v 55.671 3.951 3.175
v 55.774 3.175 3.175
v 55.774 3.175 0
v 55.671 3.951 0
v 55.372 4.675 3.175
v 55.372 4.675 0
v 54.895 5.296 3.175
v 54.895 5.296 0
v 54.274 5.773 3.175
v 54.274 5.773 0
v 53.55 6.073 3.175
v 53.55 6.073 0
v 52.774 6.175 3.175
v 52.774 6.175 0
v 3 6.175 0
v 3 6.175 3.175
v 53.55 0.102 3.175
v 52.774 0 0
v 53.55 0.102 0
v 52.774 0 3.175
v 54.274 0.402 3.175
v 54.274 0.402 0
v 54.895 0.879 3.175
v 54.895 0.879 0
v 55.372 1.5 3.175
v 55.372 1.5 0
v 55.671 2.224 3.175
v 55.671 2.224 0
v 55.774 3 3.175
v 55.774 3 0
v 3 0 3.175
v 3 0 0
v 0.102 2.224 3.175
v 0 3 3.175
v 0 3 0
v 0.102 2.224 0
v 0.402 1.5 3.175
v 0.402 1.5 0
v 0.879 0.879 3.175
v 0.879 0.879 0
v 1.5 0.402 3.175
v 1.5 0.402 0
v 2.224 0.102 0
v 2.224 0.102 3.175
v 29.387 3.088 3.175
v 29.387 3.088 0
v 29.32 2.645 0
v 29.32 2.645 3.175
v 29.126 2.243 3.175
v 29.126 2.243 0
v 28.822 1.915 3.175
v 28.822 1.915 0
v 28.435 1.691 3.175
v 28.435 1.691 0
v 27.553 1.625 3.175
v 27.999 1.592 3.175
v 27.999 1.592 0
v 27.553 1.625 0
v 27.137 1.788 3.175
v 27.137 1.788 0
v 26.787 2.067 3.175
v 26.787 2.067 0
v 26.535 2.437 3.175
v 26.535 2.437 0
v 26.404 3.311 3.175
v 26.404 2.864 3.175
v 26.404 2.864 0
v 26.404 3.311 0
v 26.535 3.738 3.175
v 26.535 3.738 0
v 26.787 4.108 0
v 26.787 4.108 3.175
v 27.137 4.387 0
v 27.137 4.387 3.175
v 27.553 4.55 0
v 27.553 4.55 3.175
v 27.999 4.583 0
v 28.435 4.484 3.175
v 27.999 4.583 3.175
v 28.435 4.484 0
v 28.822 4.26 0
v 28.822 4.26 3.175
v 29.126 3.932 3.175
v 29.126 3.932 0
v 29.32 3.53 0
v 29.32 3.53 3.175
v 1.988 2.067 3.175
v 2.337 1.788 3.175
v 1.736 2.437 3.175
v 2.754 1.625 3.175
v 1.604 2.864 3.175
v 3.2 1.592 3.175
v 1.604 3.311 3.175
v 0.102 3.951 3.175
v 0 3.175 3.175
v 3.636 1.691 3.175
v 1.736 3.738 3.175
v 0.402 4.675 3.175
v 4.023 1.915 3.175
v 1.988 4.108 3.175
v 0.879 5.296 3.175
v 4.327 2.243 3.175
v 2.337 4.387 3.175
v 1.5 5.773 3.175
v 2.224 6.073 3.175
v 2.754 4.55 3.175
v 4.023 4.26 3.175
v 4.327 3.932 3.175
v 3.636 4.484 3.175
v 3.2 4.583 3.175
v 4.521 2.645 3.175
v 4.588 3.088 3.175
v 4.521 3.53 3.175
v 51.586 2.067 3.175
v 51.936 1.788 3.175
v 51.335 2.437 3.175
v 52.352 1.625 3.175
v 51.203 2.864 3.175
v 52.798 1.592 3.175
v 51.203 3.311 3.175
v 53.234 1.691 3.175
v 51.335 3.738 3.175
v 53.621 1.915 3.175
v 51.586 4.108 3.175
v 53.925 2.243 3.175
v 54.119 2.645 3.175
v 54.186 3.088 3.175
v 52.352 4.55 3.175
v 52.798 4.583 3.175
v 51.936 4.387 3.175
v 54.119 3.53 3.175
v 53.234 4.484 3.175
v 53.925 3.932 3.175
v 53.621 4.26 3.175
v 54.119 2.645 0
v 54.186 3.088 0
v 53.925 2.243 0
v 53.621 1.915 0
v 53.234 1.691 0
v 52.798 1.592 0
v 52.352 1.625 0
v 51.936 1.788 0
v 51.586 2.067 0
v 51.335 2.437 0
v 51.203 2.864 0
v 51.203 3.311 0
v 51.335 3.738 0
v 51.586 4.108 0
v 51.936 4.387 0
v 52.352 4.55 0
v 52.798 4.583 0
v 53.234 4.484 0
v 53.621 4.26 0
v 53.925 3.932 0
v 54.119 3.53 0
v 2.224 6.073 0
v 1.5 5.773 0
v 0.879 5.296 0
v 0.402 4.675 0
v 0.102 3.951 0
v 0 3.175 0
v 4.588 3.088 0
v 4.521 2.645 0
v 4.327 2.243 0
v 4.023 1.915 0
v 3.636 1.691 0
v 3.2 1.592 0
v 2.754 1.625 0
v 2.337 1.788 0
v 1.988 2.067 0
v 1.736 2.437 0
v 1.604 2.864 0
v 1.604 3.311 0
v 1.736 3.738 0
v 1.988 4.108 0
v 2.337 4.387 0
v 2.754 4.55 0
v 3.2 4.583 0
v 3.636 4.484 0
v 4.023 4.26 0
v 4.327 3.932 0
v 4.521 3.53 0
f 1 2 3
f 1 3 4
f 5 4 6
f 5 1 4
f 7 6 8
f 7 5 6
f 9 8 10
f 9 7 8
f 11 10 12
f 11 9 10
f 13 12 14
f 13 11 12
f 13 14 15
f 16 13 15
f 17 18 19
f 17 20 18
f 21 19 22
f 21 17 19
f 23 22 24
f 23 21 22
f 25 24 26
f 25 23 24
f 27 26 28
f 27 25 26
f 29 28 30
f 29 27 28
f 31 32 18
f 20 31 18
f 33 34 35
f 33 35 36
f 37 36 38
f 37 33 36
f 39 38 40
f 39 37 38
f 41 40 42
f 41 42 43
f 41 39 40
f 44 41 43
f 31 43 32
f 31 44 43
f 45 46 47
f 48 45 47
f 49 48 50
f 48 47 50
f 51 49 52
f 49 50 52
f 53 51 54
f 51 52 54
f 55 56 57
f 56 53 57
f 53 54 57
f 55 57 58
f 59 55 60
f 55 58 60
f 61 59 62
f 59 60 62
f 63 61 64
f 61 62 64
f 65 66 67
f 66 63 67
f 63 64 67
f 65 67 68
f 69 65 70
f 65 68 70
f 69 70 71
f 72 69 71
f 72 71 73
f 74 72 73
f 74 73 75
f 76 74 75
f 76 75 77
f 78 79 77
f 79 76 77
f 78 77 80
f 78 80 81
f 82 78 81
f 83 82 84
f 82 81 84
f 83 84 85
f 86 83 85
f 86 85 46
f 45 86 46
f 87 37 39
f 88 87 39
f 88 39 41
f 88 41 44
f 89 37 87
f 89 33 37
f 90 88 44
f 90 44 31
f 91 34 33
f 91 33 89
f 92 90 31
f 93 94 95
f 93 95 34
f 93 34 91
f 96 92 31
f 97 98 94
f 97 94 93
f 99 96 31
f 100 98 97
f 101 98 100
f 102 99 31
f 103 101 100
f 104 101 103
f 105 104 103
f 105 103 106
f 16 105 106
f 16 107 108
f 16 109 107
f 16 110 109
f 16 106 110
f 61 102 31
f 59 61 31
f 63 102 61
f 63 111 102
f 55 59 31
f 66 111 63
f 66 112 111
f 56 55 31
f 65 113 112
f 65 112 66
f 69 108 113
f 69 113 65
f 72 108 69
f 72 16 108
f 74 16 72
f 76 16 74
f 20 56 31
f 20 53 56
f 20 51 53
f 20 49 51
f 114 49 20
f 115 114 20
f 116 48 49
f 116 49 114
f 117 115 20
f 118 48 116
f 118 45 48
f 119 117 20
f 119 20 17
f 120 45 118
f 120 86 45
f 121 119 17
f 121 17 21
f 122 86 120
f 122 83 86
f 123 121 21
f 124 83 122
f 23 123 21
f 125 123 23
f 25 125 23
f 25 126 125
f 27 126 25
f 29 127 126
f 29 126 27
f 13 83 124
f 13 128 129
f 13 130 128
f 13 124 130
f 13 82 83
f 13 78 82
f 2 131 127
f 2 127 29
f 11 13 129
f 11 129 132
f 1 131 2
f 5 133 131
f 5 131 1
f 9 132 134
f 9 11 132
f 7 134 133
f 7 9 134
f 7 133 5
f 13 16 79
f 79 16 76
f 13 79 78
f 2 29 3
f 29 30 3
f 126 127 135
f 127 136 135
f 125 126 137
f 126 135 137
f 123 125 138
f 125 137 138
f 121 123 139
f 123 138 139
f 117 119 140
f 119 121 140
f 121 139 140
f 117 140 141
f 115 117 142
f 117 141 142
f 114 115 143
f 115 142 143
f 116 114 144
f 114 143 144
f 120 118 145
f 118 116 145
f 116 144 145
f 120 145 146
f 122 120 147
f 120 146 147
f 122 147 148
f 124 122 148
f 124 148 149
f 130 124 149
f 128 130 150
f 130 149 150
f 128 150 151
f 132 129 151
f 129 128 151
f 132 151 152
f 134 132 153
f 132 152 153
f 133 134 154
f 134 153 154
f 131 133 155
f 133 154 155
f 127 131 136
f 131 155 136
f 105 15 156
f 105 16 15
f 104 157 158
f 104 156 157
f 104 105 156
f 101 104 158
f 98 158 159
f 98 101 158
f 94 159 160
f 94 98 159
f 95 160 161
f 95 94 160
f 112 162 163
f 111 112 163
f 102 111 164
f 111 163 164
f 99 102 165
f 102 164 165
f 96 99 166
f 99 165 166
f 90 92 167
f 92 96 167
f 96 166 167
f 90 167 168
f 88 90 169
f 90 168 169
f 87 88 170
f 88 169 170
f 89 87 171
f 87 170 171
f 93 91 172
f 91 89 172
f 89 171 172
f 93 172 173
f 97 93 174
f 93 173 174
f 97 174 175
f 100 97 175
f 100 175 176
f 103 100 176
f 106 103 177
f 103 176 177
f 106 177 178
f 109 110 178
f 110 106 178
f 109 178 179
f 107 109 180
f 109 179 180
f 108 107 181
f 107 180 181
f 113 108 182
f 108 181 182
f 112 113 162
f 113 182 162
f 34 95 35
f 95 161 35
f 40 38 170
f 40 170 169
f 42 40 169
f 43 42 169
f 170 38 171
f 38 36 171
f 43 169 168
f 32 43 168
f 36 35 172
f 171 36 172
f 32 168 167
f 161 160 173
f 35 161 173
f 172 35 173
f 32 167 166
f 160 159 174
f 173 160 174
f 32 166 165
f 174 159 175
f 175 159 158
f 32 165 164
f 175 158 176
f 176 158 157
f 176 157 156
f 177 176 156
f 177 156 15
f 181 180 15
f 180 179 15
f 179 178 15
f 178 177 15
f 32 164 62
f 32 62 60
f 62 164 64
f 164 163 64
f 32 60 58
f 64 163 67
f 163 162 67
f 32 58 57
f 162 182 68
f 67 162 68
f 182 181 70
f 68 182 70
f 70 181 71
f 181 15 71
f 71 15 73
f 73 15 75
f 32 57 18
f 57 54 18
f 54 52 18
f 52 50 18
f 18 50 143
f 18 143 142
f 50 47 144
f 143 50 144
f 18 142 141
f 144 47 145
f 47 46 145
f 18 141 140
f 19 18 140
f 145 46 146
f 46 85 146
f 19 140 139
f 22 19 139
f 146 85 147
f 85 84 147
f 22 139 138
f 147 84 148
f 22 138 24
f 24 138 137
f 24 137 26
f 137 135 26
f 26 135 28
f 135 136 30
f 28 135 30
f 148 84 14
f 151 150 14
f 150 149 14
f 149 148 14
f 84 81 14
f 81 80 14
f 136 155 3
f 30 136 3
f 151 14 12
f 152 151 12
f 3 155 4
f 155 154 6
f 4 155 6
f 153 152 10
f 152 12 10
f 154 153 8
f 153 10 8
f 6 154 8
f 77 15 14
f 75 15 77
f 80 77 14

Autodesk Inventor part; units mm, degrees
ref_plane "YZ Plane" through (0, 0, 0) normal (1, 0, 0) x (0, 1, 0)
ref_plane "XZ Plane" through (0, 0, 0) normal (0, 1, 0) x (-1, 0, 0)
ref_plane "XY Plane" through (0, 0, 0) normal (0, 0, 1) x (1, 0, 0)
sketch "Sketch1" plane through (0, 0, 0) normal (0, 0, 1) x (1, 0, 0)
  line L0 (0, 0) -> (55.7735, 0)
  line L1 (55.7735, 0) -> (55.7735, 6.175)
  line L2 (55.7735, 6.175) -> (0, 6.175)
  line L3 (0, 6.175) -> (0, 0)
  line L4 (27.8868, 6.175) -> (27.8868, 0) construction
  circle A0 centre (27.8868, 3.0875) radius 1.5
  line L5 (3.0875, 6.175) -> (3.0875, 0) construction
  line L6 (52.686, 6.175) -> (52.686, 0) construction
  circle A1 centre (3.0875, 3.0875) radius 1.5
  circle A2 centre (52.686, 3.0875) radius 1.5
  line L7 (3.0875, 3.0875) -> (0, 3.0875) construction
  line L8 (52.686, 3.0875) -> (55.7735, 3.0875) construction
  line L9 (54.1985, 3.0875) -> (54.1985, 0) construction
  dimension "d4" = 3
  dimension "d8" = 49.5986
  dimension "d10" = 6.175
extrude "Extrusion1" add sketch "Sketch1" along normal blind 3.175
fillet "Fillet1" radius 3 4 edges at (0, 6.175, 1.5875) (0, 0, 1.5875) (55.7735, 6.175, 1.5875) (55.7735, 0, 1.5875)
equation "\"d4\" = hole_size"
equation "\"d5\" = hole_size"
equation "\"arm_length\" = support_length"
equation "\"hole_size\" = 3"
equation "\"support_length\" = 58.42"
properties part number "_3DPrint"
